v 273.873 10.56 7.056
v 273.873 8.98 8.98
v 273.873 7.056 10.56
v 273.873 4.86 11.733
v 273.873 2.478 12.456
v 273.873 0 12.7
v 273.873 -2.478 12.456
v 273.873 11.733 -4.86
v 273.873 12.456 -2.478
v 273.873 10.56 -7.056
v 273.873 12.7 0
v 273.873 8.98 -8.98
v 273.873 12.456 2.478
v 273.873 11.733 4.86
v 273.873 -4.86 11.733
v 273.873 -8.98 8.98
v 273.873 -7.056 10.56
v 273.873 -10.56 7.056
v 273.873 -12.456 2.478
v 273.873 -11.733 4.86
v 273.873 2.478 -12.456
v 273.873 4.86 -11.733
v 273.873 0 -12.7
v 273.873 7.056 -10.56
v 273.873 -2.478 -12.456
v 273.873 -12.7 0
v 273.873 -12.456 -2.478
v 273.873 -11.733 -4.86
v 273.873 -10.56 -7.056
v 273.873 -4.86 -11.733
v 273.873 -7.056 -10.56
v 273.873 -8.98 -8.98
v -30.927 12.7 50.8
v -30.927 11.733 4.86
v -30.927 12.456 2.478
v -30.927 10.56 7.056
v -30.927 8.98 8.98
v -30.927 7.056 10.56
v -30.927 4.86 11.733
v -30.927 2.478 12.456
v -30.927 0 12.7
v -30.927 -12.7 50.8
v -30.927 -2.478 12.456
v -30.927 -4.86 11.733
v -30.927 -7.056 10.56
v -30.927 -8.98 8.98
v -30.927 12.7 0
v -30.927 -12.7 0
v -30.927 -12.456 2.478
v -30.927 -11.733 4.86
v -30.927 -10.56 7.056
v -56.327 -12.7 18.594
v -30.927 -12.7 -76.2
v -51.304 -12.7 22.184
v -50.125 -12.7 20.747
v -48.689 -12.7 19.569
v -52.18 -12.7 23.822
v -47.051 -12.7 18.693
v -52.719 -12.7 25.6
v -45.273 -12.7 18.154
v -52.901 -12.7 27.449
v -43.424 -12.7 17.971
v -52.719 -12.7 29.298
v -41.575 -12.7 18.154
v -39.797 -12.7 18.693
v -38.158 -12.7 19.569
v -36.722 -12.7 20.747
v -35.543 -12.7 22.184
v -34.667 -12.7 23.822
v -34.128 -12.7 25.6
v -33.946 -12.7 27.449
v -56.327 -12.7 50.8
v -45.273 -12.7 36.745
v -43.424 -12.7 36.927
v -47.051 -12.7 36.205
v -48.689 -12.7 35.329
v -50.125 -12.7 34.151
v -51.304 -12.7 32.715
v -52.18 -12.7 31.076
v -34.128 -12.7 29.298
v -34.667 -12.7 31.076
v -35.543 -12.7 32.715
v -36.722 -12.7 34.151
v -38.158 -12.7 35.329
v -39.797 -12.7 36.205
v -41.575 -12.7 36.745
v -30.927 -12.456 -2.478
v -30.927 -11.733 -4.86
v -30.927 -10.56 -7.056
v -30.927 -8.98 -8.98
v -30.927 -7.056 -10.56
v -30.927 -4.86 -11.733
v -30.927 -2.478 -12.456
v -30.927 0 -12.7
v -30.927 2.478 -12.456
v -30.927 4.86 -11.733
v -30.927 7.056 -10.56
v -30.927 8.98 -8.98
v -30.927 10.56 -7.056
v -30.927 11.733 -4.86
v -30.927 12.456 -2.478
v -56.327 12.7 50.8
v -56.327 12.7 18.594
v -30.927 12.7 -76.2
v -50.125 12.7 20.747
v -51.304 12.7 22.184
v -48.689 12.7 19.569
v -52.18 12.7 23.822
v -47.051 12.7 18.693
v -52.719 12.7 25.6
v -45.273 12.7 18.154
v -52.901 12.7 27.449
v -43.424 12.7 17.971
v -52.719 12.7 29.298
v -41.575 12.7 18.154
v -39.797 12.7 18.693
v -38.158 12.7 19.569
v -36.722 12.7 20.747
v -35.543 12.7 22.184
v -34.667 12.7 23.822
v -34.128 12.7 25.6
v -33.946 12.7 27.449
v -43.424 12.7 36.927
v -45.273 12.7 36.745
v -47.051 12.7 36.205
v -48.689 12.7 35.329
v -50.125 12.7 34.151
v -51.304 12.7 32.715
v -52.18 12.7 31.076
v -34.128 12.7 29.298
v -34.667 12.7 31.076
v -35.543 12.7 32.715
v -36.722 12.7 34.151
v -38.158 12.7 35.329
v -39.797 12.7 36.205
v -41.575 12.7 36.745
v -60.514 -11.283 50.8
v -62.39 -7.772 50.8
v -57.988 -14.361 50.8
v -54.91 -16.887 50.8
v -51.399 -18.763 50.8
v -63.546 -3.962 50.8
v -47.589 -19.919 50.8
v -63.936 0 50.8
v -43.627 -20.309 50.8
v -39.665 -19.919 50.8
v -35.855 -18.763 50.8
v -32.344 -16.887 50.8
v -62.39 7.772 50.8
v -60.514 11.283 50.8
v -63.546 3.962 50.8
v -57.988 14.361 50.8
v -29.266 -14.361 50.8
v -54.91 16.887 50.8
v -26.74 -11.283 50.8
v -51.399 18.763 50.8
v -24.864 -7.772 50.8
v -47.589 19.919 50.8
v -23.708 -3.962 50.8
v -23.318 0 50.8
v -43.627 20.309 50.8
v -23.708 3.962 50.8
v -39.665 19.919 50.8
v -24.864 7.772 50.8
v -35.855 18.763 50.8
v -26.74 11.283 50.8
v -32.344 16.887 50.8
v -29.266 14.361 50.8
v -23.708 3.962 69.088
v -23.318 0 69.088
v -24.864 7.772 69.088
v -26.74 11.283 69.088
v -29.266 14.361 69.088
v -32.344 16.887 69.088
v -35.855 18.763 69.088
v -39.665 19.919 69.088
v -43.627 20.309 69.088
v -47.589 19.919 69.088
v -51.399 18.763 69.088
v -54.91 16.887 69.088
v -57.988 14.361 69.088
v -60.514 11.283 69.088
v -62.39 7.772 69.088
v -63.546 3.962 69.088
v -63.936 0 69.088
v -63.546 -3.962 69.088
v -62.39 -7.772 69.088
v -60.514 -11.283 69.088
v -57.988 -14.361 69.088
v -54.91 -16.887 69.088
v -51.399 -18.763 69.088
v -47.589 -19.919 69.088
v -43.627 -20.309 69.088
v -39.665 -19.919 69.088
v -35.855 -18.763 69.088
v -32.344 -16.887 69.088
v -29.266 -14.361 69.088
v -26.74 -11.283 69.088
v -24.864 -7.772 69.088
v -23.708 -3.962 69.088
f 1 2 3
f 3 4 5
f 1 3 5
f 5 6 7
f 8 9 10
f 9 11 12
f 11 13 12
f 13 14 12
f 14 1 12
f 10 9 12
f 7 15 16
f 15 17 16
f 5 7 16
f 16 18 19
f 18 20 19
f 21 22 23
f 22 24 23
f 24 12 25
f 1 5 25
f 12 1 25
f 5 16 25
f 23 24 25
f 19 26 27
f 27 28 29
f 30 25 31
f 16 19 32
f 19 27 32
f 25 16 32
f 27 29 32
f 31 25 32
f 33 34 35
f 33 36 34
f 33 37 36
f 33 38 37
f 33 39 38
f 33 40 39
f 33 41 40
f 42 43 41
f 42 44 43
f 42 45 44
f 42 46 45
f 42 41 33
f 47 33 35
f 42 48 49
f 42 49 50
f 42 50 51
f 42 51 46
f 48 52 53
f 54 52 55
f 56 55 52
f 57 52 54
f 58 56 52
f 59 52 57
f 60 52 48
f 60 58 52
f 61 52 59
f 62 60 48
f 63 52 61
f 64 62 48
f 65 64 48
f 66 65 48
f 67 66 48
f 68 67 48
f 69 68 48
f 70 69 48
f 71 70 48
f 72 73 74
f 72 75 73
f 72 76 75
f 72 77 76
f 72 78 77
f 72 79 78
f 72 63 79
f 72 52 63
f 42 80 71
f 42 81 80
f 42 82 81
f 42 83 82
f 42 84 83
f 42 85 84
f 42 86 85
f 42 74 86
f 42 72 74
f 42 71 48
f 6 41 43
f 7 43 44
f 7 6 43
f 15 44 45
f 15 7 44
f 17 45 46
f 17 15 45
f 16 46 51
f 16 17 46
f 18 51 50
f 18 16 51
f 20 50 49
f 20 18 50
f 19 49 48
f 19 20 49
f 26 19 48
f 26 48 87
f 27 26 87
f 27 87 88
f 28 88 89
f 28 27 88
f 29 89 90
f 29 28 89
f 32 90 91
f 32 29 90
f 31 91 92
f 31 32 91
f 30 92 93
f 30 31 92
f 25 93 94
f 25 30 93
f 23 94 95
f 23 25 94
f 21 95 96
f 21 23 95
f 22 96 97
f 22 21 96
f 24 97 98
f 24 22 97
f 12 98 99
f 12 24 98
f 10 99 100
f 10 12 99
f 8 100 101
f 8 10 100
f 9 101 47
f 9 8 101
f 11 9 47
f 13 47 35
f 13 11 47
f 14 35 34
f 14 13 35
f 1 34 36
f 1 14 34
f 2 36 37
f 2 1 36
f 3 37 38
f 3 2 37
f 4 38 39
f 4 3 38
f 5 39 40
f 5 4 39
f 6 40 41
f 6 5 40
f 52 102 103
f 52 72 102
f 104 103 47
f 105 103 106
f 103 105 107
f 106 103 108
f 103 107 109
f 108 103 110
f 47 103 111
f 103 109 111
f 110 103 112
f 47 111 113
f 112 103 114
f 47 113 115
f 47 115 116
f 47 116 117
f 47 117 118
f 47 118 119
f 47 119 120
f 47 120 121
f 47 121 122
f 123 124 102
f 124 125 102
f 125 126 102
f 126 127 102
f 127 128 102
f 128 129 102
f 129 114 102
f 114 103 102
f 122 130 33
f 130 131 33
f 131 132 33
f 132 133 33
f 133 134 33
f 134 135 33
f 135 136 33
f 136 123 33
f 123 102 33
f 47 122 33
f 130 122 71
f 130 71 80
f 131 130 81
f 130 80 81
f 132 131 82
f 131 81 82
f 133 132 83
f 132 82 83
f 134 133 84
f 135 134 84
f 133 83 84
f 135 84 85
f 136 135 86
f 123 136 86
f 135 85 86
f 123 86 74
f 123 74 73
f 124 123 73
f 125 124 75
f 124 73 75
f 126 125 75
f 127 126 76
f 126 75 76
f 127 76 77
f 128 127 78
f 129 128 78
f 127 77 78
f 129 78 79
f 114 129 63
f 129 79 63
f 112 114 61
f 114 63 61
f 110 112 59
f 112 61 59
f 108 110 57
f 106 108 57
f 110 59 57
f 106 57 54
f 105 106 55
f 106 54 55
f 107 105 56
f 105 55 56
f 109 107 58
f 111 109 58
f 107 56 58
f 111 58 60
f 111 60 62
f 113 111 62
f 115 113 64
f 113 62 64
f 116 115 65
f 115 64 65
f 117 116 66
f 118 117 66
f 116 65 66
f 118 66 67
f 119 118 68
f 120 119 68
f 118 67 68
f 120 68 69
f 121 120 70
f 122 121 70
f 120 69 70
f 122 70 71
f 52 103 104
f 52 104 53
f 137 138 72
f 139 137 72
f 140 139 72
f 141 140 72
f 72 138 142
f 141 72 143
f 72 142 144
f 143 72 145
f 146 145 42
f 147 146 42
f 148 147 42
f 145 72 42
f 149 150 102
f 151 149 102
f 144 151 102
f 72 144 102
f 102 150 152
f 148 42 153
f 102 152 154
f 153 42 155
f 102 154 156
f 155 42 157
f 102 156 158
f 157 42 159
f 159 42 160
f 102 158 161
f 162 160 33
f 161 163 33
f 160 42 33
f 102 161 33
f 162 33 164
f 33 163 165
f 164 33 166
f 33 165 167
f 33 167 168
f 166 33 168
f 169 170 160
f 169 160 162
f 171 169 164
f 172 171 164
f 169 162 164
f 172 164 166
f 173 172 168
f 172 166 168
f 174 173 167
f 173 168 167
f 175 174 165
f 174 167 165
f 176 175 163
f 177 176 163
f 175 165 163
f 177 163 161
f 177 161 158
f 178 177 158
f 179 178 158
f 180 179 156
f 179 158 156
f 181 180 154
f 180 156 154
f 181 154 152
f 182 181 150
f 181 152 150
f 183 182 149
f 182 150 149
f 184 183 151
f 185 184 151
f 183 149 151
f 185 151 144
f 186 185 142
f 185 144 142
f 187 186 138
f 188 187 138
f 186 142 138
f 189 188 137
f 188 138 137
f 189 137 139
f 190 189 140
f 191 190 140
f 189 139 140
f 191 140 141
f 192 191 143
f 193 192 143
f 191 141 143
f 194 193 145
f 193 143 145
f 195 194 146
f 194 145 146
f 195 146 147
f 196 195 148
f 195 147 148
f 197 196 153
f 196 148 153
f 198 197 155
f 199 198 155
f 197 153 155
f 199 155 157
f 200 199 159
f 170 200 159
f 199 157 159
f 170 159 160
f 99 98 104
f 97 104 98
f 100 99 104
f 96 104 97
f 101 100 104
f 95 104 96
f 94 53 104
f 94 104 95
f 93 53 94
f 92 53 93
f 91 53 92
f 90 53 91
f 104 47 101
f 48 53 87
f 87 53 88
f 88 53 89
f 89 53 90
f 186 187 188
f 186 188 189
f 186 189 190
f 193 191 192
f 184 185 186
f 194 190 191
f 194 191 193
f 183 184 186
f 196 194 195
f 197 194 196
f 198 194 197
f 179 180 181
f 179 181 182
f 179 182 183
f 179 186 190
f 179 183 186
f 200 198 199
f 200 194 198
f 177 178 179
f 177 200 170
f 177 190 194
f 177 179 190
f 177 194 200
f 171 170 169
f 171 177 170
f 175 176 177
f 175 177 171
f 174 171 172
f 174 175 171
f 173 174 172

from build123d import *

# Parameters (mm, degrees)
F0_W     = 304.8
F0_H     = 12.7
F0_W_2   = 25.4
F0_H_2   = 76.2
F2_DEPTH = 12.7
F3_SIZE2 = 94.794081
F3_SIZE  = 25.39999
F4_R     = 20.3093495569
F4_W     = 25.4
F4_H     = 25.4
F5_DEPTH = 18.288
F6_R     = 9.4776416284
F7_DEPTH = 25.4


# Not quite as in the source:
# - a fillet or chamfer is up to 0.001 mm smaller than in the source, because OpenCascade refuses the exact size


with BuildPart() as f1:
    # F0 (on Front) → F1 (revolve)
    with BuildSketch(Plane.XZ):
        with Locations((121.4729587615, 6.35)):
            Rectangle(F0_W, F0_H)
    revolve(axis=Axis((121.4729587615, 0, 0), (1, 0, 0)))

    # F0 (on Front) → F2 (join, symmetric)
    with BuildSketch(Plane.XZ):
        Polygon((-56.3270412385, 0), (-30.9270412385, 0), (-30.9270412385, 12.7), (-30.9270412385, 50.8), (-56.3270412385, 50.8), align=None)
        with Locations((-43.6270412385, -38.1)):
            Rectangle(F0_W_2, F0_H_2)
    extrude(amount=F2_DEPTH, both=True)

    # F3 (size 25.4 and 94.7940905122 in the source; OpenCascade refuses exactly that, so slightly less here)
    f3_edges = [f1.edges().sort_by_distance(p)[0] for p in [
        (-56.327041, 0, -76.2),
    ]]
    f3_side = f1.faces().sort_by_distance((-43.627041, 0, -76.2))[0]
    chamfer(f3_edges, length=F3_SIZE, length2=F3_SIZE2, reference=f3_side)

    # F4 (on face) → F5 (join)
    with BuildSketch(Plane.XY.offset(50.8)):
        with Locations((-43.6270412385, 0)):
            Circle(F4_R)
        with Locations((-43.6270412385, 0)):
            Rectangle(F4_W, F4_H, mode=Mode.SUBTRACT)
        with Locations((-43.6270412385, 0)):
            Rectangle(F4_W, F4_H)
    extrude(amount=F5_DEPTH)

    # F6 (on face) → F7 (cut)
    with BuildSketch(Plane.XZ.offset(12.7)):
        with Locations((-43.4236600995, 27.4490546435)):
            Circle(F6_R)
    extrude(amount=-F7_DEPTH, mode=Mode.SUBTRACT)


solid = f1.part
